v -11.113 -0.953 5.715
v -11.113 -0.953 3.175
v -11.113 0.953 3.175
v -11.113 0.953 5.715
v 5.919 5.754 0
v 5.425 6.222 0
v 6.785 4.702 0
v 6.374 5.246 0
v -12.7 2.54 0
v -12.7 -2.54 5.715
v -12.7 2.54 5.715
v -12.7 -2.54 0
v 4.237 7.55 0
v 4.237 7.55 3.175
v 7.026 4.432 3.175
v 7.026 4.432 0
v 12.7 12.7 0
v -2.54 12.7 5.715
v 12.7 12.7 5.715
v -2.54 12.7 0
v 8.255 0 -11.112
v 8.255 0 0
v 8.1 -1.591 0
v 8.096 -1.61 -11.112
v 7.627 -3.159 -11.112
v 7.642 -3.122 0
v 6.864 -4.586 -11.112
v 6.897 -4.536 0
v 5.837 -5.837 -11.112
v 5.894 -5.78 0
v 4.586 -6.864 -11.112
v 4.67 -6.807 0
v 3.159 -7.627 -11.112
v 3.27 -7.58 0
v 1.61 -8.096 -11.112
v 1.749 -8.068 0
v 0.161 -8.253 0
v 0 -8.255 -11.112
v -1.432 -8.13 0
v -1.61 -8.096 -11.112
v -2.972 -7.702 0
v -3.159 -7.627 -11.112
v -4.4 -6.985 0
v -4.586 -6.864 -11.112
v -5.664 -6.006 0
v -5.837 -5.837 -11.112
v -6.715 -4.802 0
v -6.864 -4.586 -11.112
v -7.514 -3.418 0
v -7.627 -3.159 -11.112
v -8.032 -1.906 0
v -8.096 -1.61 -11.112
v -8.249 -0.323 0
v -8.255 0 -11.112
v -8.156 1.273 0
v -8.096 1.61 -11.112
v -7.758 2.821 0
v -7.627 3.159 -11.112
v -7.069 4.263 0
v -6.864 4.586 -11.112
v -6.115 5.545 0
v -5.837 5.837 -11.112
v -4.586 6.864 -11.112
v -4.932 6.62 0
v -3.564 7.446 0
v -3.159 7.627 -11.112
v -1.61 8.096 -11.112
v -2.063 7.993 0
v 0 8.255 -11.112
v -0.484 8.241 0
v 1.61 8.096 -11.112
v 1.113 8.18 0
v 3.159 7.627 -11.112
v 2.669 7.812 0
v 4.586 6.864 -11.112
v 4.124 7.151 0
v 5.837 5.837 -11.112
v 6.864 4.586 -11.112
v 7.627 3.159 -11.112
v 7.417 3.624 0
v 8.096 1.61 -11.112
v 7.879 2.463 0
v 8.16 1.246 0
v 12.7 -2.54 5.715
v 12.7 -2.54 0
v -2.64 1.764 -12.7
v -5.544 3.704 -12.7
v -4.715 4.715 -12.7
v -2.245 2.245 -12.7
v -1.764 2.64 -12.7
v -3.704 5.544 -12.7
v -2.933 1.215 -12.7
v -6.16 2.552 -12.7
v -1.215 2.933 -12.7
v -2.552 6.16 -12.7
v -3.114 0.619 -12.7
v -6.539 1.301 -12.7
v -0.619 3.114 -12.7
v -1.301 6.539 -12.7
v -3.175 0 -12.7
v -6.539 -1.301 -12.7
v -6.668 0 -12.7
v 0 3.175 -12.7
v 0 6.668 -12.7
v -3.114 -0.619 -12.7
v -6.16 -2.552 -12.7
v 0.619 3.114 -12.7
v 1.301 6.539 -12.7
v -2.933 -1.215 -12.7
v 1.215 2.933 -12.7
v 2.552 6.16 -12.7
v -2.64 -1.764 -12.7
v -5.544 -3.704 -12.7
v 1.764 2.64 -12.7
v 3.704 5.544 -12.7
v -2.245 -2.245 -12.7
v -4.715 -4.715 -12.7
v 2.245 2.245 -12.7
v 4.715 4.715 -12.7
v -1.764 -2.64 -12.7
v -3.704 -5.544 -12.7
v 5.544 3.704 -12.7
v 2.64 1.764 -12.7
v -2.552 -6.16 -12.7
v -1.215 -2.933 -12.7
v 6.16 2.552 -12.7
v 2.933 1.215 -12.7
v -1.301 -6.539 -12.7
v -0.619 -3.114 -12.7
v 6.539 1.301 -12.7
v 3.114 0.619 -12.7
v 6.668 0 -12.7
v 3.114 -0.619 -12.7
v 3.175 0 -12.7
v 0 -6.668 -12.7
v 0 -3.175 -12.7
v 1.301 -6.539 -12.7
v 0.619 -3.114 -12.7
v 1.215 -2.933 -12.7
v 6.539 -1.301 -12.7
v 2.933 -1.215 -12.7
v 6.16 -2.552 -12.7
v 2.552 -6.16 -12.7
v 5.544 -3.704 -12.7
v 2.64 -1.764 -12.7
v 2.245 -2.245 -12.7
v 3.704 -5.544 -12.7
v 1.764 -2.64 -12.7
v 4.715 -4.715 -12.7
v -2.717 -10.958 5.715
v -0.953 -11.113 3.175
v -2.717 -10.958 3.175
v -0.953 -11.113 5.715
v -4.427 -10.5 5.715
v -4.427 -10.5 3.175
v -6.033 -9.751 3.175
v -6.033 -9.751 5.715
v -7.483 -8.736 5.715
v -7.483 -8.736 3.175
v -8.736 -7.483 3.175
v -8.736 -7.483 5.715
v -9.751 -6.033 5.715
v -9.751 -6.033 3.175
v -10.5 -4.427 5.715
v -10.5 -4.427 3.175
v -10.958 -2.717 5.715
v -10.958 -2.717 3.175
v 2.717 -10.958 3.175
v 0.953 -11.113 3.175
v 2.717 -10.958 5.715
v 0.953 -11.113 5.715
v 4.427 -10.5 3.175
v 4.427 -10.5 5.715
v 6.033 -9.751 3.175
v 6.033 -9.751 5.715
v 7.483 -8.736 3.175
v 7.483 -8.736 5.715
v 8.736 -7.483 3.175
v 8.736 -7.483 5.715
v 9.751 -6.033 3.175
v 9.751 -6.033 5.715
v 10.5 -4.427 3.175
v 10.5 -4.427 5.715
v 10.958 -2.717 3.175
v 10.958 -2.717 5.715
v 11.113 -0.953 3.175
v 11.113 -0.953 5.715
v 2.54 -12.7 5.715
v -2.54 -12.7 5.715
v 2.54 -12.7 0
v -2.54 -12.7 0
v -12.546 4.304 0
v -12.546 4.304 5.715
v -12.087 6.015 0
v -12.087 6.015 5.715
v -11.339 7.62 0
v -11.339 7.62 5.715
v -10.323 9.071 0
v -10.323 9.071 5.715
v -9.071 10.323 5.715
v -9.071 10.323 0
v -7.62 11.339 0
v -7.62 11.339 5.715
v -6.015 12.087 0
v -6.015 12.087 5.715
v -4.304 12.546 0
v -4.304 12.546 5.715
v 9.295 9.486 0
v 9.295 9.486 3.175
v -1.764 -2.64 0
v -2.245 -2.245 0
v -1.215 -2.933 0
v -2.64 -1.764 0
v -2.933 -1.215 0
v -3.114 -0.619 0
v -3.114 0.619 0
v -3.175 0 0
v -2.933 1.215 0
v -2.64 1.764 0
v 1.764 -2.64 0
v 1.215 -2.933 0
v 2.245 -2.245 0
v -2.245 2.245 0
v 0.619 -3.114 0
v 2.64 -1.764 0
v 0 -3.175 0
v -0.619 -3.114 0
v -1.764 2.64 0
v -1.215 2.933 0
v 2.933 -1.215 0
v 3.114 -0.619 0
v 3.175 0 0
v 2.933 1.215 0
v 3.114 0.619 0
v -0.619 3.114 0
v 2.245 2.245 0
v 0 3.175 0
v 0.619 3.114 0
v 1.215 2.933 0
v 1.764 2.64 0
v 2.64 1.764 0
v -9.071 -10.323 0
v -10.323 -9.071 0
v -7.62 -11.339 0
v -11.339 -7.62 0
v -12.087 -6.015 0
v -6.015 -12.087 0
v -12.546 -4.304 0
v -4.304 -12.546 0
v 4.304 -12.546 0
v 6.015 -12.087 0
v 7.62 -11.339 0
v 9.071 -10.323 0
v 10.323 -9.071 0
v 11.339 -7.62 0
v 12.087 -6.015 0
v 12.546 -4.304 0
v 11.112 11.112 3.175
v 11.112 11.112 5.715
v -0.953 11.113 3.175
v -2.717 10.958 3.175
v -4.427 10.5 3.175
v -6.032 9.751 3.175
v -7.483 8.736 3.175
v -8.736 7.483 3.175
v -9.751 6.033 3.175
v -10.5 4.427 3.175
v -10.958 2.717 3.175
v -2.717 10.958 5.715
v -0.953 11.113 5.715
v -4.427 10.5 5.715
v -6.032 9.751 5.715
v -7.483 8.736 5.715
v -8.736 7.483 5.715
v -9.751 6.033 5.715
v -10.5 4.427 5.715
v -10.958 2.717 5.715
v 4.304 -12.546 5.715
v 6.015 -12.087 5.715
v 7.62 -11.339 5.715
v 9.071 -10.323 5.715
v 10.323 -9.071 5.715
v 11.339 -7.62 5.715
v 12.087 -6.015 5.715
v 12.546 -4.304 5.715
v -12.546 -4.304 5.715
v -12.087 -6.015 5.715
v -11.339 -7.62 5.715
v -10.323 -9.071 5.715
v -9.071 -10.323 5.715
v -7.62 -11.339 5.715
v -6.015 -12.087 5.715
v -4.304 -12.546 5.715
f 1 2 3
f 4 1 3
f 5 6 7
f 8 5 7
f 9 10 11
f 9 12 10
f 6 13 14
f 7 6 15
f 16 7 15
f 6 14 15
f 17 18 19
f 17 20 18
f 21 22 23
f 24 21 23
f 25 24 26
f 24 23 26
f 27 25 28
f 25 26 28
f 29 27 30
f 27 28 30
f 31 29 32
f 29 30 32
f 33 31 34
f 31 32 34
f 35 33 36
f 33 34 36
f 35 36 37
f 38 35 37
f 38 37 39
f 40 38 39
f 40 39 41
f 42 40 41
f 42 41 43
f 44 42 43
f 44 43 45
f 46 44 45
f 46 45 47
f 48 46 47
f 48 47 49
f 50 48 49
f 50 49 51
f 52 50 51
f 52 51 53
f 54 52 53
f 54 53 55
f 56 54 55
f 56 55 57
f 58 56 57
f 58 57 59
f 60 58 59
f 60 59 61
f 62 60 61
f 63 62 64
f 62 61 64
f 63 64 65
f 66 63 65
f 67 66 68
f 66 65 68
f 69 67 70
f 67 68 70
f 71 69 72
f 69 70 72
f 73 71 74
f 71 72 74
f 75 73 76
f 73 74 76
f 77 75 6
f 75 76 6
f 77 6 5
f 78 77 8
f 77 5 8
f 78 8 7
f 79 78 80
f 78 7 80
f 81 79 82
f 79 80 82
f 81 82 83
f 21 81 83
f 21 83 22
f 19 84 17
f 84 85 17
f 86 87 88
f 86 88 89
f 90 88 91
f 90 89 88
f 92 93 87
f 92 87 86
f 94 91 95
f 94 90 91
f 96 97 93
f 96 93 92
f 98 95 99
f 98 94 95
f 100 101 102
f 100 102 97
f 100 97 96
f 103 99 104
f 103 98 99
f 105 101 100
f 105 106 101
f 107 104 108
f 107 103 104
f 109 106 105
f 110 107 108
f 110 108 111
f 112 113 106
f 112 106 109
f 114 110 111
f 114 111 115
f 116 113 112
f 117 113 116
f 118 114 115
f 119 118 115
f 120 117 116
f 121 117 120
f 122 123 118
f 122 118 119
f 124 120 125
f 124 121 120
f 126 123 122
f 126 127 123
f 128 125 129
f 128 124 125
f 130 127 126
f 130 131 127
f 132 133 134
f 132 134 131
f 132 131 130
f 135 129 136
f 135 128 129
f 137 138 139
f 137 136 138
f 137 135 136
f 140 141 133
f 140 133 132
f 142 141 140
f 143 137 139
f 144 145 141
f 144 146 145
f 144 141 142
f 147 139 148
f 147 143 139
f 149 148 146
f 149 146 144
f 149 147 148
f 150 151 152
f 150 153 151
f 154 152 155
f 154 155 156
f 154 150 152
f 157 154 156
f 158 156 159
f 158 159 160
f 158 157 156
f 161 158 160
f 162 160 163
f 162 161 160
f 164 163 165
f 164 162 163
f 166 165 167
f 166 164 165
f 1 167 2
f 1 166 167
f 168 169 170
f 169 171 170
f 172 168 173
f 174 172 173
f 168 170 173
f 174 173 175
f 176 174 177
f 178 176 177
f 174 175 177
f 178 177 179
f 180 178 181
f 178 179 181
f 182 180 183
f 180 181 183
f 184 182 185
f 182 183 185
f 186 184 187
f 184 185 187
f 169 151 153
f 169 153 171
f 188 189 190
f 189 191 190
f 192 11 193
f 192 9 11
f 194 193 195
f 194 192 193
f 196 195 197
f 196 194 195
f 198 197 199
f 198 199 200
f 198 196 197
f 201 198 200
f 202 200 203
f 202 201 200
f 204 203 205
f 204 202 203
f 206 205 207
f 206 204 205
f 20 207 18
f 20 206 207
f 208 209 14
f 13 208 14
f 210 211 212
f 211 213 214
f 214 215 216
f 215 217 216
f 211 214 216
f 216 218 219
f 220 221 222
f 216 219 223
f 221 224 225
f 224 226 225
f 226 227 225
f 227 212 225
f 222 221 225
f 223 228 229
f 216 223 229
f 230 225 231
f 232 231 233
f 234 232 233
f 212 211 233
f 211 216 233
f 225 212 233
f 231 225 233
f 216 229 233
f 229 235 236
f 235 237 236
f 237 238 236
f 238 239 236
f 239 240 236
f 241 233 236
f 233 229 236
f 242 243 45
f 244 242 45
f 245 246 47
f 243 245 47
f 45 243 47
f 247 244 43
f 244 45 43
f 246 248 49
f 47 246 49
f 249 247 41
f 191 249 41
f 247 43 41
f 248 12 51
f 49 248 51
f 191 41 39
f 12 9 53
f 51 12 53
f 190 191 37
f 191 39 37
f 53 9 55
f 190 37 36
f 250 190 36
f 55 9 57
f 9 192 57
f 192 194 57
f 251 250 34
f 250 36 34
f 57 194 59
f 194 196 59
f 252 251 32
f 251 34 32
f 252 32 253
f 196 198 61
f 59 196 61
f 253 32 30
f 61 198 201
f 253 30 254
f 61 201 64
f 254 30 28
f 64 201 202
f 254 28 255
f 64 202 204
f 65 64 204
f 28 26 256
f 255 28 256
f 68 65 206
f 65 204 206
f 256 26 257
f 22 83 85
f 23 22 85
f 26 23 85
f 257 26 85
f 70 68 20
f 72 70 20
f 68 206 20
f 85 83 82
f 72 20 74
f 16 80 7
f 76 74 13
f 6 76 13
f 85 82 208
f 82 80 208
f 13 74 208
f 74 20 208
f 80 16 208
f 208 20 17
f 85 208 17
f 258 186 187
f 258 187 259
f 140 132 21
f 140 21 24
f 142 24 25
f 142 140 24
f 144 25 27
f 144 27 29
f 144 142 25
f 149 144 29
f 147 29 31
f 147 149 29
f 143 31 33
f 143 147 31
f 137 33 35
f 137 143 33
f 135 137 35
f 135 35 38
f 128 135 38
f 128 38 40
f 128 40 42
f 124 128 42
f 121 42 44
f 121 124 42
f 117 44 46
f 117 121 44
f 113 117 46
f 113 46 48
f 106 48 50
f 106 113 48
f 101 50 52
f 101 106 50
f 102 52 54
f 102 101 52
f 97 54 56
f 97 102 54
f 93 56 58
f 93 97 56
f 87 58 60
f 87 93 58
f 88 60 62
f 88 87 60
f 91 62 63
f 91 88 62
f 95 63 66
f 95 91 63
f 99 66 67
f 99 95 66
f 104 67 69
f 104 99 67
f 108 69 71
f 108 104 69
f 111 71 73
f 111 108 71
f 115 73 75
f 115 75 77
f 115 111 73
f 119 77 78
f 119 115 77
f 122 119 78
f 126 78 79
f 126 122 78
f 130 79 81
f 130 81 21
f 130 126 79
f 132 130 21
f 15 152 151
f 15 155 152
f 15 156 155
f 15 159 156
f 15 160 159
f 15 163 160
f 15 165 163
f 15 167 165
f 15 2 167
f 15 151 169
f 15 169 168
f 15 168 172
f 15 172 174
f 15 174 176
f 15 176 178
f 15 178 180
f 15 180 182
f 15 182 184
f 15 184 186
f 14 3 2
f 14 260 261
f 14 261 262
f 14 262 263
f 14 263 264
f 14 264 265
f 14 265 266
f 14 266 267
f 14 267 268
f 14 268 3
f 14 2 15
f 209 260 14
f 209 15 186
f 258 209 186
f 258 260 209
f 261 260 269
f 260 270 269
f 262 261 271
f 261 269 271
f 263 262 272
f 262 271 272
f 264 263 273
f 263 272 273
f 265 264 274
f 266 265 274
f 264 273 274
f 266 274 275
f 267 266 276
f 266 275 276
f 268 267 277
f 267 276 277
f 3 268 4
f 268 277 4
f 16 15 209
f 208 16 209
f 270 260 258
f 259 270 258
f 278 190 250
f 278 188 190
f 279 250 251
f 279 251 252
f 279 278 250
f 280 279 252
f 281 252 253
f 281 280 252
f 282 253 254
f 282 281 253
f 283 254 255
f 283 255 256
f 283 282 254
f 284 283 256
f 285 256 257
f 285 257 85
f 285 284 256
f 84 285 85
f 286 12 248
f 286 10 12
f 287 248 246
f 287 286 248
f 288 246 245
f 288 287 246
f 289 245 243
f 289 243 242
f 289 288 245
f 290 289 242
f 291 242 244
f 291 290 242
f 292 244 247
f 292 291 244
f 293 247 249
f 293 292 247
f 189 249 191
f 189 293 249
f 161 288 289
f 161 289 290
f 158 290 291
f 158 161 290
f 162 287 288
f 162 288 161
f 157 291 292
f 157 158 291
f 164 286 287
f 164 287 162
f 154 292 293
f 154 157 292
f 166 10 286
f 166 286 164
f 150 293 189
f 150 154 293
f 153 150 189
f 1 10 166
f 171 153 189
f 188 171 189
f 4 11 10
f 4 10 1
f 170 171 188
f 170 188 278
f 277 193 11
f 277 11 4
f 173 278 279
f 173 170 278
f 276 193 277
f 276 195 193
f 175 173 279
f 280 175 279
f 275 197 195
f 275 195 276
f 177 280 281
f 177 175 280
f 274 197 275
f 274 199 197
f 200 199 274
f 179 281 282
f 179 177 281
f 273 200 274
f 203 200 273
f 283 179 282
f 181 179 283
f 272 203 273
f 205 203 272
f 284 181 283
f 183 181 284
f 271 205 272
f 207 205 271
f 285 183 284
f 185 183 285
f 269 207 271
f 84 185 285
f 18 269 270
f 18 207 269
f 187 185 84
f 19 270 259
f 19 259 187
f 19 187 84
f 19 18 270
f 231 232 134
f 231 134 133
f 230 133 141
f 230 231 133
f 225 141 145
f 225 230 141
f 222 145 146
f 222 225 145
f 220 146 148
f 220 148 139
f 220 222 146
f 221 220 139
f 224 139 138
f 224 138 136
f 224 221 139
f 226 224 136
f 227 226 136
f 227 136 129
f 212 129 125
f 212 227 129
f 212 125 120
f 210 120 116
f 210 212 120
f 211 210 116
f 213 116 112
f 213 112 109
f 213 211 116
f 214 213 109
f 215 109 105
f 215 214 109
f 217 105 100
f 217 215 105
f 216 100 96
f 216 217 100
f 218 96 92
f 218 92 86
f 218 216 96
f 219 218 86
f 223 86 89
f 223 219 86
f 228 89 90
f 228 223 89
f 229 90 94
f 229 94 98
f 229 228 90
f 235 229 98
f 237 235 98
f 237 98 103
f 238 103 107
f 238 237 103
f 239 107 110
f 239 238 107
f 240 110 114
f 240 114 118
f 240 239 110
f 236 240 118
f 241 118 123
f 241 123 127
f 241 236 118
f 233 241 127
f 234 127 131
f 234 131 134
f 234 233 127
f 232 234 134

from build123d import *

# Parameters (mm, degrees)
F0_W     = 25.4
F0_H     = 25.4
F1_DEPTH = 3.175
F2_W     = 25.4
F2_H     = 25.4
F2_W_2   = 22.225
F2_H_2   = 22.225
F3_DEPTH = 2.54
F5_DEPTH = 25.4
F6_R     = 8.255
F6_R_2   = 3.175
F7_DEPTH = 12.7
F8_R     = 10.16
F9_SIZE  = 1.5875


with BuildPart() as f1:
    # F0 (on Top) → F1 (new body)
    with BuildSketch(Plane.XY):
        Rectangle(F0_W, F0_H)
    extrude(amount=F1_DEPTH)

    # F2 (on face) → F3 (join)
    with BuildSketch(Plane.XY.offset(3.175)):
        Rectangle(F2_W, F2_H)
        Rectangle(F2_W_2, F2_H_2, mode=Mode.SUBTRACT)
    extrude(amount=F3_DEPTH)

    # F4 (on face) → F5 (cut)
    with BuildSketch(Plane.XY.offset(3.175)):
        Polygon((7.026218, 4.432465), (9.295024, 9.48628), (4.236917, 7.549808), align=None)
    extrude(amount=-F5_DEPTH, mode=Mode.SUBTRACT)

    # F6 (on face) → F7 (join)
    with BuildSketch(Plane(origin=(0, 0, 0), x_dir=(1, 0, 0), z_dir=(0, 0, -1))):
        Circle(F6_R)
        Circle(F6_R_2, mode=Mode.SUBTRACT)
    extrude(amount=F7_DEPTH)

    # F8
    f8_edges = [f1.edges().sort_by_distance(p)[0] for p in [
        (12.7, -12.7, 2.8575),
        (-12.7, -12.7, 2.8575),
        (-11.1125, -11.1125, 4.445),
        (11.1125, -11.1125, 4.445),
        (-11.1125, 11.1125, 4.445),
        (-12.7, 12.7, 2.8575),
    ]]
    fillet(f8_edges, radius=F8_R)

    # F9
    f9_edges = [f1.edges().sort_by_distance(p)[0] for p in [
        (-8.255, 0, -12.7),
    ]]
    chamfer(f9_edges, length=F9_SIZE)


solid = f1.part
